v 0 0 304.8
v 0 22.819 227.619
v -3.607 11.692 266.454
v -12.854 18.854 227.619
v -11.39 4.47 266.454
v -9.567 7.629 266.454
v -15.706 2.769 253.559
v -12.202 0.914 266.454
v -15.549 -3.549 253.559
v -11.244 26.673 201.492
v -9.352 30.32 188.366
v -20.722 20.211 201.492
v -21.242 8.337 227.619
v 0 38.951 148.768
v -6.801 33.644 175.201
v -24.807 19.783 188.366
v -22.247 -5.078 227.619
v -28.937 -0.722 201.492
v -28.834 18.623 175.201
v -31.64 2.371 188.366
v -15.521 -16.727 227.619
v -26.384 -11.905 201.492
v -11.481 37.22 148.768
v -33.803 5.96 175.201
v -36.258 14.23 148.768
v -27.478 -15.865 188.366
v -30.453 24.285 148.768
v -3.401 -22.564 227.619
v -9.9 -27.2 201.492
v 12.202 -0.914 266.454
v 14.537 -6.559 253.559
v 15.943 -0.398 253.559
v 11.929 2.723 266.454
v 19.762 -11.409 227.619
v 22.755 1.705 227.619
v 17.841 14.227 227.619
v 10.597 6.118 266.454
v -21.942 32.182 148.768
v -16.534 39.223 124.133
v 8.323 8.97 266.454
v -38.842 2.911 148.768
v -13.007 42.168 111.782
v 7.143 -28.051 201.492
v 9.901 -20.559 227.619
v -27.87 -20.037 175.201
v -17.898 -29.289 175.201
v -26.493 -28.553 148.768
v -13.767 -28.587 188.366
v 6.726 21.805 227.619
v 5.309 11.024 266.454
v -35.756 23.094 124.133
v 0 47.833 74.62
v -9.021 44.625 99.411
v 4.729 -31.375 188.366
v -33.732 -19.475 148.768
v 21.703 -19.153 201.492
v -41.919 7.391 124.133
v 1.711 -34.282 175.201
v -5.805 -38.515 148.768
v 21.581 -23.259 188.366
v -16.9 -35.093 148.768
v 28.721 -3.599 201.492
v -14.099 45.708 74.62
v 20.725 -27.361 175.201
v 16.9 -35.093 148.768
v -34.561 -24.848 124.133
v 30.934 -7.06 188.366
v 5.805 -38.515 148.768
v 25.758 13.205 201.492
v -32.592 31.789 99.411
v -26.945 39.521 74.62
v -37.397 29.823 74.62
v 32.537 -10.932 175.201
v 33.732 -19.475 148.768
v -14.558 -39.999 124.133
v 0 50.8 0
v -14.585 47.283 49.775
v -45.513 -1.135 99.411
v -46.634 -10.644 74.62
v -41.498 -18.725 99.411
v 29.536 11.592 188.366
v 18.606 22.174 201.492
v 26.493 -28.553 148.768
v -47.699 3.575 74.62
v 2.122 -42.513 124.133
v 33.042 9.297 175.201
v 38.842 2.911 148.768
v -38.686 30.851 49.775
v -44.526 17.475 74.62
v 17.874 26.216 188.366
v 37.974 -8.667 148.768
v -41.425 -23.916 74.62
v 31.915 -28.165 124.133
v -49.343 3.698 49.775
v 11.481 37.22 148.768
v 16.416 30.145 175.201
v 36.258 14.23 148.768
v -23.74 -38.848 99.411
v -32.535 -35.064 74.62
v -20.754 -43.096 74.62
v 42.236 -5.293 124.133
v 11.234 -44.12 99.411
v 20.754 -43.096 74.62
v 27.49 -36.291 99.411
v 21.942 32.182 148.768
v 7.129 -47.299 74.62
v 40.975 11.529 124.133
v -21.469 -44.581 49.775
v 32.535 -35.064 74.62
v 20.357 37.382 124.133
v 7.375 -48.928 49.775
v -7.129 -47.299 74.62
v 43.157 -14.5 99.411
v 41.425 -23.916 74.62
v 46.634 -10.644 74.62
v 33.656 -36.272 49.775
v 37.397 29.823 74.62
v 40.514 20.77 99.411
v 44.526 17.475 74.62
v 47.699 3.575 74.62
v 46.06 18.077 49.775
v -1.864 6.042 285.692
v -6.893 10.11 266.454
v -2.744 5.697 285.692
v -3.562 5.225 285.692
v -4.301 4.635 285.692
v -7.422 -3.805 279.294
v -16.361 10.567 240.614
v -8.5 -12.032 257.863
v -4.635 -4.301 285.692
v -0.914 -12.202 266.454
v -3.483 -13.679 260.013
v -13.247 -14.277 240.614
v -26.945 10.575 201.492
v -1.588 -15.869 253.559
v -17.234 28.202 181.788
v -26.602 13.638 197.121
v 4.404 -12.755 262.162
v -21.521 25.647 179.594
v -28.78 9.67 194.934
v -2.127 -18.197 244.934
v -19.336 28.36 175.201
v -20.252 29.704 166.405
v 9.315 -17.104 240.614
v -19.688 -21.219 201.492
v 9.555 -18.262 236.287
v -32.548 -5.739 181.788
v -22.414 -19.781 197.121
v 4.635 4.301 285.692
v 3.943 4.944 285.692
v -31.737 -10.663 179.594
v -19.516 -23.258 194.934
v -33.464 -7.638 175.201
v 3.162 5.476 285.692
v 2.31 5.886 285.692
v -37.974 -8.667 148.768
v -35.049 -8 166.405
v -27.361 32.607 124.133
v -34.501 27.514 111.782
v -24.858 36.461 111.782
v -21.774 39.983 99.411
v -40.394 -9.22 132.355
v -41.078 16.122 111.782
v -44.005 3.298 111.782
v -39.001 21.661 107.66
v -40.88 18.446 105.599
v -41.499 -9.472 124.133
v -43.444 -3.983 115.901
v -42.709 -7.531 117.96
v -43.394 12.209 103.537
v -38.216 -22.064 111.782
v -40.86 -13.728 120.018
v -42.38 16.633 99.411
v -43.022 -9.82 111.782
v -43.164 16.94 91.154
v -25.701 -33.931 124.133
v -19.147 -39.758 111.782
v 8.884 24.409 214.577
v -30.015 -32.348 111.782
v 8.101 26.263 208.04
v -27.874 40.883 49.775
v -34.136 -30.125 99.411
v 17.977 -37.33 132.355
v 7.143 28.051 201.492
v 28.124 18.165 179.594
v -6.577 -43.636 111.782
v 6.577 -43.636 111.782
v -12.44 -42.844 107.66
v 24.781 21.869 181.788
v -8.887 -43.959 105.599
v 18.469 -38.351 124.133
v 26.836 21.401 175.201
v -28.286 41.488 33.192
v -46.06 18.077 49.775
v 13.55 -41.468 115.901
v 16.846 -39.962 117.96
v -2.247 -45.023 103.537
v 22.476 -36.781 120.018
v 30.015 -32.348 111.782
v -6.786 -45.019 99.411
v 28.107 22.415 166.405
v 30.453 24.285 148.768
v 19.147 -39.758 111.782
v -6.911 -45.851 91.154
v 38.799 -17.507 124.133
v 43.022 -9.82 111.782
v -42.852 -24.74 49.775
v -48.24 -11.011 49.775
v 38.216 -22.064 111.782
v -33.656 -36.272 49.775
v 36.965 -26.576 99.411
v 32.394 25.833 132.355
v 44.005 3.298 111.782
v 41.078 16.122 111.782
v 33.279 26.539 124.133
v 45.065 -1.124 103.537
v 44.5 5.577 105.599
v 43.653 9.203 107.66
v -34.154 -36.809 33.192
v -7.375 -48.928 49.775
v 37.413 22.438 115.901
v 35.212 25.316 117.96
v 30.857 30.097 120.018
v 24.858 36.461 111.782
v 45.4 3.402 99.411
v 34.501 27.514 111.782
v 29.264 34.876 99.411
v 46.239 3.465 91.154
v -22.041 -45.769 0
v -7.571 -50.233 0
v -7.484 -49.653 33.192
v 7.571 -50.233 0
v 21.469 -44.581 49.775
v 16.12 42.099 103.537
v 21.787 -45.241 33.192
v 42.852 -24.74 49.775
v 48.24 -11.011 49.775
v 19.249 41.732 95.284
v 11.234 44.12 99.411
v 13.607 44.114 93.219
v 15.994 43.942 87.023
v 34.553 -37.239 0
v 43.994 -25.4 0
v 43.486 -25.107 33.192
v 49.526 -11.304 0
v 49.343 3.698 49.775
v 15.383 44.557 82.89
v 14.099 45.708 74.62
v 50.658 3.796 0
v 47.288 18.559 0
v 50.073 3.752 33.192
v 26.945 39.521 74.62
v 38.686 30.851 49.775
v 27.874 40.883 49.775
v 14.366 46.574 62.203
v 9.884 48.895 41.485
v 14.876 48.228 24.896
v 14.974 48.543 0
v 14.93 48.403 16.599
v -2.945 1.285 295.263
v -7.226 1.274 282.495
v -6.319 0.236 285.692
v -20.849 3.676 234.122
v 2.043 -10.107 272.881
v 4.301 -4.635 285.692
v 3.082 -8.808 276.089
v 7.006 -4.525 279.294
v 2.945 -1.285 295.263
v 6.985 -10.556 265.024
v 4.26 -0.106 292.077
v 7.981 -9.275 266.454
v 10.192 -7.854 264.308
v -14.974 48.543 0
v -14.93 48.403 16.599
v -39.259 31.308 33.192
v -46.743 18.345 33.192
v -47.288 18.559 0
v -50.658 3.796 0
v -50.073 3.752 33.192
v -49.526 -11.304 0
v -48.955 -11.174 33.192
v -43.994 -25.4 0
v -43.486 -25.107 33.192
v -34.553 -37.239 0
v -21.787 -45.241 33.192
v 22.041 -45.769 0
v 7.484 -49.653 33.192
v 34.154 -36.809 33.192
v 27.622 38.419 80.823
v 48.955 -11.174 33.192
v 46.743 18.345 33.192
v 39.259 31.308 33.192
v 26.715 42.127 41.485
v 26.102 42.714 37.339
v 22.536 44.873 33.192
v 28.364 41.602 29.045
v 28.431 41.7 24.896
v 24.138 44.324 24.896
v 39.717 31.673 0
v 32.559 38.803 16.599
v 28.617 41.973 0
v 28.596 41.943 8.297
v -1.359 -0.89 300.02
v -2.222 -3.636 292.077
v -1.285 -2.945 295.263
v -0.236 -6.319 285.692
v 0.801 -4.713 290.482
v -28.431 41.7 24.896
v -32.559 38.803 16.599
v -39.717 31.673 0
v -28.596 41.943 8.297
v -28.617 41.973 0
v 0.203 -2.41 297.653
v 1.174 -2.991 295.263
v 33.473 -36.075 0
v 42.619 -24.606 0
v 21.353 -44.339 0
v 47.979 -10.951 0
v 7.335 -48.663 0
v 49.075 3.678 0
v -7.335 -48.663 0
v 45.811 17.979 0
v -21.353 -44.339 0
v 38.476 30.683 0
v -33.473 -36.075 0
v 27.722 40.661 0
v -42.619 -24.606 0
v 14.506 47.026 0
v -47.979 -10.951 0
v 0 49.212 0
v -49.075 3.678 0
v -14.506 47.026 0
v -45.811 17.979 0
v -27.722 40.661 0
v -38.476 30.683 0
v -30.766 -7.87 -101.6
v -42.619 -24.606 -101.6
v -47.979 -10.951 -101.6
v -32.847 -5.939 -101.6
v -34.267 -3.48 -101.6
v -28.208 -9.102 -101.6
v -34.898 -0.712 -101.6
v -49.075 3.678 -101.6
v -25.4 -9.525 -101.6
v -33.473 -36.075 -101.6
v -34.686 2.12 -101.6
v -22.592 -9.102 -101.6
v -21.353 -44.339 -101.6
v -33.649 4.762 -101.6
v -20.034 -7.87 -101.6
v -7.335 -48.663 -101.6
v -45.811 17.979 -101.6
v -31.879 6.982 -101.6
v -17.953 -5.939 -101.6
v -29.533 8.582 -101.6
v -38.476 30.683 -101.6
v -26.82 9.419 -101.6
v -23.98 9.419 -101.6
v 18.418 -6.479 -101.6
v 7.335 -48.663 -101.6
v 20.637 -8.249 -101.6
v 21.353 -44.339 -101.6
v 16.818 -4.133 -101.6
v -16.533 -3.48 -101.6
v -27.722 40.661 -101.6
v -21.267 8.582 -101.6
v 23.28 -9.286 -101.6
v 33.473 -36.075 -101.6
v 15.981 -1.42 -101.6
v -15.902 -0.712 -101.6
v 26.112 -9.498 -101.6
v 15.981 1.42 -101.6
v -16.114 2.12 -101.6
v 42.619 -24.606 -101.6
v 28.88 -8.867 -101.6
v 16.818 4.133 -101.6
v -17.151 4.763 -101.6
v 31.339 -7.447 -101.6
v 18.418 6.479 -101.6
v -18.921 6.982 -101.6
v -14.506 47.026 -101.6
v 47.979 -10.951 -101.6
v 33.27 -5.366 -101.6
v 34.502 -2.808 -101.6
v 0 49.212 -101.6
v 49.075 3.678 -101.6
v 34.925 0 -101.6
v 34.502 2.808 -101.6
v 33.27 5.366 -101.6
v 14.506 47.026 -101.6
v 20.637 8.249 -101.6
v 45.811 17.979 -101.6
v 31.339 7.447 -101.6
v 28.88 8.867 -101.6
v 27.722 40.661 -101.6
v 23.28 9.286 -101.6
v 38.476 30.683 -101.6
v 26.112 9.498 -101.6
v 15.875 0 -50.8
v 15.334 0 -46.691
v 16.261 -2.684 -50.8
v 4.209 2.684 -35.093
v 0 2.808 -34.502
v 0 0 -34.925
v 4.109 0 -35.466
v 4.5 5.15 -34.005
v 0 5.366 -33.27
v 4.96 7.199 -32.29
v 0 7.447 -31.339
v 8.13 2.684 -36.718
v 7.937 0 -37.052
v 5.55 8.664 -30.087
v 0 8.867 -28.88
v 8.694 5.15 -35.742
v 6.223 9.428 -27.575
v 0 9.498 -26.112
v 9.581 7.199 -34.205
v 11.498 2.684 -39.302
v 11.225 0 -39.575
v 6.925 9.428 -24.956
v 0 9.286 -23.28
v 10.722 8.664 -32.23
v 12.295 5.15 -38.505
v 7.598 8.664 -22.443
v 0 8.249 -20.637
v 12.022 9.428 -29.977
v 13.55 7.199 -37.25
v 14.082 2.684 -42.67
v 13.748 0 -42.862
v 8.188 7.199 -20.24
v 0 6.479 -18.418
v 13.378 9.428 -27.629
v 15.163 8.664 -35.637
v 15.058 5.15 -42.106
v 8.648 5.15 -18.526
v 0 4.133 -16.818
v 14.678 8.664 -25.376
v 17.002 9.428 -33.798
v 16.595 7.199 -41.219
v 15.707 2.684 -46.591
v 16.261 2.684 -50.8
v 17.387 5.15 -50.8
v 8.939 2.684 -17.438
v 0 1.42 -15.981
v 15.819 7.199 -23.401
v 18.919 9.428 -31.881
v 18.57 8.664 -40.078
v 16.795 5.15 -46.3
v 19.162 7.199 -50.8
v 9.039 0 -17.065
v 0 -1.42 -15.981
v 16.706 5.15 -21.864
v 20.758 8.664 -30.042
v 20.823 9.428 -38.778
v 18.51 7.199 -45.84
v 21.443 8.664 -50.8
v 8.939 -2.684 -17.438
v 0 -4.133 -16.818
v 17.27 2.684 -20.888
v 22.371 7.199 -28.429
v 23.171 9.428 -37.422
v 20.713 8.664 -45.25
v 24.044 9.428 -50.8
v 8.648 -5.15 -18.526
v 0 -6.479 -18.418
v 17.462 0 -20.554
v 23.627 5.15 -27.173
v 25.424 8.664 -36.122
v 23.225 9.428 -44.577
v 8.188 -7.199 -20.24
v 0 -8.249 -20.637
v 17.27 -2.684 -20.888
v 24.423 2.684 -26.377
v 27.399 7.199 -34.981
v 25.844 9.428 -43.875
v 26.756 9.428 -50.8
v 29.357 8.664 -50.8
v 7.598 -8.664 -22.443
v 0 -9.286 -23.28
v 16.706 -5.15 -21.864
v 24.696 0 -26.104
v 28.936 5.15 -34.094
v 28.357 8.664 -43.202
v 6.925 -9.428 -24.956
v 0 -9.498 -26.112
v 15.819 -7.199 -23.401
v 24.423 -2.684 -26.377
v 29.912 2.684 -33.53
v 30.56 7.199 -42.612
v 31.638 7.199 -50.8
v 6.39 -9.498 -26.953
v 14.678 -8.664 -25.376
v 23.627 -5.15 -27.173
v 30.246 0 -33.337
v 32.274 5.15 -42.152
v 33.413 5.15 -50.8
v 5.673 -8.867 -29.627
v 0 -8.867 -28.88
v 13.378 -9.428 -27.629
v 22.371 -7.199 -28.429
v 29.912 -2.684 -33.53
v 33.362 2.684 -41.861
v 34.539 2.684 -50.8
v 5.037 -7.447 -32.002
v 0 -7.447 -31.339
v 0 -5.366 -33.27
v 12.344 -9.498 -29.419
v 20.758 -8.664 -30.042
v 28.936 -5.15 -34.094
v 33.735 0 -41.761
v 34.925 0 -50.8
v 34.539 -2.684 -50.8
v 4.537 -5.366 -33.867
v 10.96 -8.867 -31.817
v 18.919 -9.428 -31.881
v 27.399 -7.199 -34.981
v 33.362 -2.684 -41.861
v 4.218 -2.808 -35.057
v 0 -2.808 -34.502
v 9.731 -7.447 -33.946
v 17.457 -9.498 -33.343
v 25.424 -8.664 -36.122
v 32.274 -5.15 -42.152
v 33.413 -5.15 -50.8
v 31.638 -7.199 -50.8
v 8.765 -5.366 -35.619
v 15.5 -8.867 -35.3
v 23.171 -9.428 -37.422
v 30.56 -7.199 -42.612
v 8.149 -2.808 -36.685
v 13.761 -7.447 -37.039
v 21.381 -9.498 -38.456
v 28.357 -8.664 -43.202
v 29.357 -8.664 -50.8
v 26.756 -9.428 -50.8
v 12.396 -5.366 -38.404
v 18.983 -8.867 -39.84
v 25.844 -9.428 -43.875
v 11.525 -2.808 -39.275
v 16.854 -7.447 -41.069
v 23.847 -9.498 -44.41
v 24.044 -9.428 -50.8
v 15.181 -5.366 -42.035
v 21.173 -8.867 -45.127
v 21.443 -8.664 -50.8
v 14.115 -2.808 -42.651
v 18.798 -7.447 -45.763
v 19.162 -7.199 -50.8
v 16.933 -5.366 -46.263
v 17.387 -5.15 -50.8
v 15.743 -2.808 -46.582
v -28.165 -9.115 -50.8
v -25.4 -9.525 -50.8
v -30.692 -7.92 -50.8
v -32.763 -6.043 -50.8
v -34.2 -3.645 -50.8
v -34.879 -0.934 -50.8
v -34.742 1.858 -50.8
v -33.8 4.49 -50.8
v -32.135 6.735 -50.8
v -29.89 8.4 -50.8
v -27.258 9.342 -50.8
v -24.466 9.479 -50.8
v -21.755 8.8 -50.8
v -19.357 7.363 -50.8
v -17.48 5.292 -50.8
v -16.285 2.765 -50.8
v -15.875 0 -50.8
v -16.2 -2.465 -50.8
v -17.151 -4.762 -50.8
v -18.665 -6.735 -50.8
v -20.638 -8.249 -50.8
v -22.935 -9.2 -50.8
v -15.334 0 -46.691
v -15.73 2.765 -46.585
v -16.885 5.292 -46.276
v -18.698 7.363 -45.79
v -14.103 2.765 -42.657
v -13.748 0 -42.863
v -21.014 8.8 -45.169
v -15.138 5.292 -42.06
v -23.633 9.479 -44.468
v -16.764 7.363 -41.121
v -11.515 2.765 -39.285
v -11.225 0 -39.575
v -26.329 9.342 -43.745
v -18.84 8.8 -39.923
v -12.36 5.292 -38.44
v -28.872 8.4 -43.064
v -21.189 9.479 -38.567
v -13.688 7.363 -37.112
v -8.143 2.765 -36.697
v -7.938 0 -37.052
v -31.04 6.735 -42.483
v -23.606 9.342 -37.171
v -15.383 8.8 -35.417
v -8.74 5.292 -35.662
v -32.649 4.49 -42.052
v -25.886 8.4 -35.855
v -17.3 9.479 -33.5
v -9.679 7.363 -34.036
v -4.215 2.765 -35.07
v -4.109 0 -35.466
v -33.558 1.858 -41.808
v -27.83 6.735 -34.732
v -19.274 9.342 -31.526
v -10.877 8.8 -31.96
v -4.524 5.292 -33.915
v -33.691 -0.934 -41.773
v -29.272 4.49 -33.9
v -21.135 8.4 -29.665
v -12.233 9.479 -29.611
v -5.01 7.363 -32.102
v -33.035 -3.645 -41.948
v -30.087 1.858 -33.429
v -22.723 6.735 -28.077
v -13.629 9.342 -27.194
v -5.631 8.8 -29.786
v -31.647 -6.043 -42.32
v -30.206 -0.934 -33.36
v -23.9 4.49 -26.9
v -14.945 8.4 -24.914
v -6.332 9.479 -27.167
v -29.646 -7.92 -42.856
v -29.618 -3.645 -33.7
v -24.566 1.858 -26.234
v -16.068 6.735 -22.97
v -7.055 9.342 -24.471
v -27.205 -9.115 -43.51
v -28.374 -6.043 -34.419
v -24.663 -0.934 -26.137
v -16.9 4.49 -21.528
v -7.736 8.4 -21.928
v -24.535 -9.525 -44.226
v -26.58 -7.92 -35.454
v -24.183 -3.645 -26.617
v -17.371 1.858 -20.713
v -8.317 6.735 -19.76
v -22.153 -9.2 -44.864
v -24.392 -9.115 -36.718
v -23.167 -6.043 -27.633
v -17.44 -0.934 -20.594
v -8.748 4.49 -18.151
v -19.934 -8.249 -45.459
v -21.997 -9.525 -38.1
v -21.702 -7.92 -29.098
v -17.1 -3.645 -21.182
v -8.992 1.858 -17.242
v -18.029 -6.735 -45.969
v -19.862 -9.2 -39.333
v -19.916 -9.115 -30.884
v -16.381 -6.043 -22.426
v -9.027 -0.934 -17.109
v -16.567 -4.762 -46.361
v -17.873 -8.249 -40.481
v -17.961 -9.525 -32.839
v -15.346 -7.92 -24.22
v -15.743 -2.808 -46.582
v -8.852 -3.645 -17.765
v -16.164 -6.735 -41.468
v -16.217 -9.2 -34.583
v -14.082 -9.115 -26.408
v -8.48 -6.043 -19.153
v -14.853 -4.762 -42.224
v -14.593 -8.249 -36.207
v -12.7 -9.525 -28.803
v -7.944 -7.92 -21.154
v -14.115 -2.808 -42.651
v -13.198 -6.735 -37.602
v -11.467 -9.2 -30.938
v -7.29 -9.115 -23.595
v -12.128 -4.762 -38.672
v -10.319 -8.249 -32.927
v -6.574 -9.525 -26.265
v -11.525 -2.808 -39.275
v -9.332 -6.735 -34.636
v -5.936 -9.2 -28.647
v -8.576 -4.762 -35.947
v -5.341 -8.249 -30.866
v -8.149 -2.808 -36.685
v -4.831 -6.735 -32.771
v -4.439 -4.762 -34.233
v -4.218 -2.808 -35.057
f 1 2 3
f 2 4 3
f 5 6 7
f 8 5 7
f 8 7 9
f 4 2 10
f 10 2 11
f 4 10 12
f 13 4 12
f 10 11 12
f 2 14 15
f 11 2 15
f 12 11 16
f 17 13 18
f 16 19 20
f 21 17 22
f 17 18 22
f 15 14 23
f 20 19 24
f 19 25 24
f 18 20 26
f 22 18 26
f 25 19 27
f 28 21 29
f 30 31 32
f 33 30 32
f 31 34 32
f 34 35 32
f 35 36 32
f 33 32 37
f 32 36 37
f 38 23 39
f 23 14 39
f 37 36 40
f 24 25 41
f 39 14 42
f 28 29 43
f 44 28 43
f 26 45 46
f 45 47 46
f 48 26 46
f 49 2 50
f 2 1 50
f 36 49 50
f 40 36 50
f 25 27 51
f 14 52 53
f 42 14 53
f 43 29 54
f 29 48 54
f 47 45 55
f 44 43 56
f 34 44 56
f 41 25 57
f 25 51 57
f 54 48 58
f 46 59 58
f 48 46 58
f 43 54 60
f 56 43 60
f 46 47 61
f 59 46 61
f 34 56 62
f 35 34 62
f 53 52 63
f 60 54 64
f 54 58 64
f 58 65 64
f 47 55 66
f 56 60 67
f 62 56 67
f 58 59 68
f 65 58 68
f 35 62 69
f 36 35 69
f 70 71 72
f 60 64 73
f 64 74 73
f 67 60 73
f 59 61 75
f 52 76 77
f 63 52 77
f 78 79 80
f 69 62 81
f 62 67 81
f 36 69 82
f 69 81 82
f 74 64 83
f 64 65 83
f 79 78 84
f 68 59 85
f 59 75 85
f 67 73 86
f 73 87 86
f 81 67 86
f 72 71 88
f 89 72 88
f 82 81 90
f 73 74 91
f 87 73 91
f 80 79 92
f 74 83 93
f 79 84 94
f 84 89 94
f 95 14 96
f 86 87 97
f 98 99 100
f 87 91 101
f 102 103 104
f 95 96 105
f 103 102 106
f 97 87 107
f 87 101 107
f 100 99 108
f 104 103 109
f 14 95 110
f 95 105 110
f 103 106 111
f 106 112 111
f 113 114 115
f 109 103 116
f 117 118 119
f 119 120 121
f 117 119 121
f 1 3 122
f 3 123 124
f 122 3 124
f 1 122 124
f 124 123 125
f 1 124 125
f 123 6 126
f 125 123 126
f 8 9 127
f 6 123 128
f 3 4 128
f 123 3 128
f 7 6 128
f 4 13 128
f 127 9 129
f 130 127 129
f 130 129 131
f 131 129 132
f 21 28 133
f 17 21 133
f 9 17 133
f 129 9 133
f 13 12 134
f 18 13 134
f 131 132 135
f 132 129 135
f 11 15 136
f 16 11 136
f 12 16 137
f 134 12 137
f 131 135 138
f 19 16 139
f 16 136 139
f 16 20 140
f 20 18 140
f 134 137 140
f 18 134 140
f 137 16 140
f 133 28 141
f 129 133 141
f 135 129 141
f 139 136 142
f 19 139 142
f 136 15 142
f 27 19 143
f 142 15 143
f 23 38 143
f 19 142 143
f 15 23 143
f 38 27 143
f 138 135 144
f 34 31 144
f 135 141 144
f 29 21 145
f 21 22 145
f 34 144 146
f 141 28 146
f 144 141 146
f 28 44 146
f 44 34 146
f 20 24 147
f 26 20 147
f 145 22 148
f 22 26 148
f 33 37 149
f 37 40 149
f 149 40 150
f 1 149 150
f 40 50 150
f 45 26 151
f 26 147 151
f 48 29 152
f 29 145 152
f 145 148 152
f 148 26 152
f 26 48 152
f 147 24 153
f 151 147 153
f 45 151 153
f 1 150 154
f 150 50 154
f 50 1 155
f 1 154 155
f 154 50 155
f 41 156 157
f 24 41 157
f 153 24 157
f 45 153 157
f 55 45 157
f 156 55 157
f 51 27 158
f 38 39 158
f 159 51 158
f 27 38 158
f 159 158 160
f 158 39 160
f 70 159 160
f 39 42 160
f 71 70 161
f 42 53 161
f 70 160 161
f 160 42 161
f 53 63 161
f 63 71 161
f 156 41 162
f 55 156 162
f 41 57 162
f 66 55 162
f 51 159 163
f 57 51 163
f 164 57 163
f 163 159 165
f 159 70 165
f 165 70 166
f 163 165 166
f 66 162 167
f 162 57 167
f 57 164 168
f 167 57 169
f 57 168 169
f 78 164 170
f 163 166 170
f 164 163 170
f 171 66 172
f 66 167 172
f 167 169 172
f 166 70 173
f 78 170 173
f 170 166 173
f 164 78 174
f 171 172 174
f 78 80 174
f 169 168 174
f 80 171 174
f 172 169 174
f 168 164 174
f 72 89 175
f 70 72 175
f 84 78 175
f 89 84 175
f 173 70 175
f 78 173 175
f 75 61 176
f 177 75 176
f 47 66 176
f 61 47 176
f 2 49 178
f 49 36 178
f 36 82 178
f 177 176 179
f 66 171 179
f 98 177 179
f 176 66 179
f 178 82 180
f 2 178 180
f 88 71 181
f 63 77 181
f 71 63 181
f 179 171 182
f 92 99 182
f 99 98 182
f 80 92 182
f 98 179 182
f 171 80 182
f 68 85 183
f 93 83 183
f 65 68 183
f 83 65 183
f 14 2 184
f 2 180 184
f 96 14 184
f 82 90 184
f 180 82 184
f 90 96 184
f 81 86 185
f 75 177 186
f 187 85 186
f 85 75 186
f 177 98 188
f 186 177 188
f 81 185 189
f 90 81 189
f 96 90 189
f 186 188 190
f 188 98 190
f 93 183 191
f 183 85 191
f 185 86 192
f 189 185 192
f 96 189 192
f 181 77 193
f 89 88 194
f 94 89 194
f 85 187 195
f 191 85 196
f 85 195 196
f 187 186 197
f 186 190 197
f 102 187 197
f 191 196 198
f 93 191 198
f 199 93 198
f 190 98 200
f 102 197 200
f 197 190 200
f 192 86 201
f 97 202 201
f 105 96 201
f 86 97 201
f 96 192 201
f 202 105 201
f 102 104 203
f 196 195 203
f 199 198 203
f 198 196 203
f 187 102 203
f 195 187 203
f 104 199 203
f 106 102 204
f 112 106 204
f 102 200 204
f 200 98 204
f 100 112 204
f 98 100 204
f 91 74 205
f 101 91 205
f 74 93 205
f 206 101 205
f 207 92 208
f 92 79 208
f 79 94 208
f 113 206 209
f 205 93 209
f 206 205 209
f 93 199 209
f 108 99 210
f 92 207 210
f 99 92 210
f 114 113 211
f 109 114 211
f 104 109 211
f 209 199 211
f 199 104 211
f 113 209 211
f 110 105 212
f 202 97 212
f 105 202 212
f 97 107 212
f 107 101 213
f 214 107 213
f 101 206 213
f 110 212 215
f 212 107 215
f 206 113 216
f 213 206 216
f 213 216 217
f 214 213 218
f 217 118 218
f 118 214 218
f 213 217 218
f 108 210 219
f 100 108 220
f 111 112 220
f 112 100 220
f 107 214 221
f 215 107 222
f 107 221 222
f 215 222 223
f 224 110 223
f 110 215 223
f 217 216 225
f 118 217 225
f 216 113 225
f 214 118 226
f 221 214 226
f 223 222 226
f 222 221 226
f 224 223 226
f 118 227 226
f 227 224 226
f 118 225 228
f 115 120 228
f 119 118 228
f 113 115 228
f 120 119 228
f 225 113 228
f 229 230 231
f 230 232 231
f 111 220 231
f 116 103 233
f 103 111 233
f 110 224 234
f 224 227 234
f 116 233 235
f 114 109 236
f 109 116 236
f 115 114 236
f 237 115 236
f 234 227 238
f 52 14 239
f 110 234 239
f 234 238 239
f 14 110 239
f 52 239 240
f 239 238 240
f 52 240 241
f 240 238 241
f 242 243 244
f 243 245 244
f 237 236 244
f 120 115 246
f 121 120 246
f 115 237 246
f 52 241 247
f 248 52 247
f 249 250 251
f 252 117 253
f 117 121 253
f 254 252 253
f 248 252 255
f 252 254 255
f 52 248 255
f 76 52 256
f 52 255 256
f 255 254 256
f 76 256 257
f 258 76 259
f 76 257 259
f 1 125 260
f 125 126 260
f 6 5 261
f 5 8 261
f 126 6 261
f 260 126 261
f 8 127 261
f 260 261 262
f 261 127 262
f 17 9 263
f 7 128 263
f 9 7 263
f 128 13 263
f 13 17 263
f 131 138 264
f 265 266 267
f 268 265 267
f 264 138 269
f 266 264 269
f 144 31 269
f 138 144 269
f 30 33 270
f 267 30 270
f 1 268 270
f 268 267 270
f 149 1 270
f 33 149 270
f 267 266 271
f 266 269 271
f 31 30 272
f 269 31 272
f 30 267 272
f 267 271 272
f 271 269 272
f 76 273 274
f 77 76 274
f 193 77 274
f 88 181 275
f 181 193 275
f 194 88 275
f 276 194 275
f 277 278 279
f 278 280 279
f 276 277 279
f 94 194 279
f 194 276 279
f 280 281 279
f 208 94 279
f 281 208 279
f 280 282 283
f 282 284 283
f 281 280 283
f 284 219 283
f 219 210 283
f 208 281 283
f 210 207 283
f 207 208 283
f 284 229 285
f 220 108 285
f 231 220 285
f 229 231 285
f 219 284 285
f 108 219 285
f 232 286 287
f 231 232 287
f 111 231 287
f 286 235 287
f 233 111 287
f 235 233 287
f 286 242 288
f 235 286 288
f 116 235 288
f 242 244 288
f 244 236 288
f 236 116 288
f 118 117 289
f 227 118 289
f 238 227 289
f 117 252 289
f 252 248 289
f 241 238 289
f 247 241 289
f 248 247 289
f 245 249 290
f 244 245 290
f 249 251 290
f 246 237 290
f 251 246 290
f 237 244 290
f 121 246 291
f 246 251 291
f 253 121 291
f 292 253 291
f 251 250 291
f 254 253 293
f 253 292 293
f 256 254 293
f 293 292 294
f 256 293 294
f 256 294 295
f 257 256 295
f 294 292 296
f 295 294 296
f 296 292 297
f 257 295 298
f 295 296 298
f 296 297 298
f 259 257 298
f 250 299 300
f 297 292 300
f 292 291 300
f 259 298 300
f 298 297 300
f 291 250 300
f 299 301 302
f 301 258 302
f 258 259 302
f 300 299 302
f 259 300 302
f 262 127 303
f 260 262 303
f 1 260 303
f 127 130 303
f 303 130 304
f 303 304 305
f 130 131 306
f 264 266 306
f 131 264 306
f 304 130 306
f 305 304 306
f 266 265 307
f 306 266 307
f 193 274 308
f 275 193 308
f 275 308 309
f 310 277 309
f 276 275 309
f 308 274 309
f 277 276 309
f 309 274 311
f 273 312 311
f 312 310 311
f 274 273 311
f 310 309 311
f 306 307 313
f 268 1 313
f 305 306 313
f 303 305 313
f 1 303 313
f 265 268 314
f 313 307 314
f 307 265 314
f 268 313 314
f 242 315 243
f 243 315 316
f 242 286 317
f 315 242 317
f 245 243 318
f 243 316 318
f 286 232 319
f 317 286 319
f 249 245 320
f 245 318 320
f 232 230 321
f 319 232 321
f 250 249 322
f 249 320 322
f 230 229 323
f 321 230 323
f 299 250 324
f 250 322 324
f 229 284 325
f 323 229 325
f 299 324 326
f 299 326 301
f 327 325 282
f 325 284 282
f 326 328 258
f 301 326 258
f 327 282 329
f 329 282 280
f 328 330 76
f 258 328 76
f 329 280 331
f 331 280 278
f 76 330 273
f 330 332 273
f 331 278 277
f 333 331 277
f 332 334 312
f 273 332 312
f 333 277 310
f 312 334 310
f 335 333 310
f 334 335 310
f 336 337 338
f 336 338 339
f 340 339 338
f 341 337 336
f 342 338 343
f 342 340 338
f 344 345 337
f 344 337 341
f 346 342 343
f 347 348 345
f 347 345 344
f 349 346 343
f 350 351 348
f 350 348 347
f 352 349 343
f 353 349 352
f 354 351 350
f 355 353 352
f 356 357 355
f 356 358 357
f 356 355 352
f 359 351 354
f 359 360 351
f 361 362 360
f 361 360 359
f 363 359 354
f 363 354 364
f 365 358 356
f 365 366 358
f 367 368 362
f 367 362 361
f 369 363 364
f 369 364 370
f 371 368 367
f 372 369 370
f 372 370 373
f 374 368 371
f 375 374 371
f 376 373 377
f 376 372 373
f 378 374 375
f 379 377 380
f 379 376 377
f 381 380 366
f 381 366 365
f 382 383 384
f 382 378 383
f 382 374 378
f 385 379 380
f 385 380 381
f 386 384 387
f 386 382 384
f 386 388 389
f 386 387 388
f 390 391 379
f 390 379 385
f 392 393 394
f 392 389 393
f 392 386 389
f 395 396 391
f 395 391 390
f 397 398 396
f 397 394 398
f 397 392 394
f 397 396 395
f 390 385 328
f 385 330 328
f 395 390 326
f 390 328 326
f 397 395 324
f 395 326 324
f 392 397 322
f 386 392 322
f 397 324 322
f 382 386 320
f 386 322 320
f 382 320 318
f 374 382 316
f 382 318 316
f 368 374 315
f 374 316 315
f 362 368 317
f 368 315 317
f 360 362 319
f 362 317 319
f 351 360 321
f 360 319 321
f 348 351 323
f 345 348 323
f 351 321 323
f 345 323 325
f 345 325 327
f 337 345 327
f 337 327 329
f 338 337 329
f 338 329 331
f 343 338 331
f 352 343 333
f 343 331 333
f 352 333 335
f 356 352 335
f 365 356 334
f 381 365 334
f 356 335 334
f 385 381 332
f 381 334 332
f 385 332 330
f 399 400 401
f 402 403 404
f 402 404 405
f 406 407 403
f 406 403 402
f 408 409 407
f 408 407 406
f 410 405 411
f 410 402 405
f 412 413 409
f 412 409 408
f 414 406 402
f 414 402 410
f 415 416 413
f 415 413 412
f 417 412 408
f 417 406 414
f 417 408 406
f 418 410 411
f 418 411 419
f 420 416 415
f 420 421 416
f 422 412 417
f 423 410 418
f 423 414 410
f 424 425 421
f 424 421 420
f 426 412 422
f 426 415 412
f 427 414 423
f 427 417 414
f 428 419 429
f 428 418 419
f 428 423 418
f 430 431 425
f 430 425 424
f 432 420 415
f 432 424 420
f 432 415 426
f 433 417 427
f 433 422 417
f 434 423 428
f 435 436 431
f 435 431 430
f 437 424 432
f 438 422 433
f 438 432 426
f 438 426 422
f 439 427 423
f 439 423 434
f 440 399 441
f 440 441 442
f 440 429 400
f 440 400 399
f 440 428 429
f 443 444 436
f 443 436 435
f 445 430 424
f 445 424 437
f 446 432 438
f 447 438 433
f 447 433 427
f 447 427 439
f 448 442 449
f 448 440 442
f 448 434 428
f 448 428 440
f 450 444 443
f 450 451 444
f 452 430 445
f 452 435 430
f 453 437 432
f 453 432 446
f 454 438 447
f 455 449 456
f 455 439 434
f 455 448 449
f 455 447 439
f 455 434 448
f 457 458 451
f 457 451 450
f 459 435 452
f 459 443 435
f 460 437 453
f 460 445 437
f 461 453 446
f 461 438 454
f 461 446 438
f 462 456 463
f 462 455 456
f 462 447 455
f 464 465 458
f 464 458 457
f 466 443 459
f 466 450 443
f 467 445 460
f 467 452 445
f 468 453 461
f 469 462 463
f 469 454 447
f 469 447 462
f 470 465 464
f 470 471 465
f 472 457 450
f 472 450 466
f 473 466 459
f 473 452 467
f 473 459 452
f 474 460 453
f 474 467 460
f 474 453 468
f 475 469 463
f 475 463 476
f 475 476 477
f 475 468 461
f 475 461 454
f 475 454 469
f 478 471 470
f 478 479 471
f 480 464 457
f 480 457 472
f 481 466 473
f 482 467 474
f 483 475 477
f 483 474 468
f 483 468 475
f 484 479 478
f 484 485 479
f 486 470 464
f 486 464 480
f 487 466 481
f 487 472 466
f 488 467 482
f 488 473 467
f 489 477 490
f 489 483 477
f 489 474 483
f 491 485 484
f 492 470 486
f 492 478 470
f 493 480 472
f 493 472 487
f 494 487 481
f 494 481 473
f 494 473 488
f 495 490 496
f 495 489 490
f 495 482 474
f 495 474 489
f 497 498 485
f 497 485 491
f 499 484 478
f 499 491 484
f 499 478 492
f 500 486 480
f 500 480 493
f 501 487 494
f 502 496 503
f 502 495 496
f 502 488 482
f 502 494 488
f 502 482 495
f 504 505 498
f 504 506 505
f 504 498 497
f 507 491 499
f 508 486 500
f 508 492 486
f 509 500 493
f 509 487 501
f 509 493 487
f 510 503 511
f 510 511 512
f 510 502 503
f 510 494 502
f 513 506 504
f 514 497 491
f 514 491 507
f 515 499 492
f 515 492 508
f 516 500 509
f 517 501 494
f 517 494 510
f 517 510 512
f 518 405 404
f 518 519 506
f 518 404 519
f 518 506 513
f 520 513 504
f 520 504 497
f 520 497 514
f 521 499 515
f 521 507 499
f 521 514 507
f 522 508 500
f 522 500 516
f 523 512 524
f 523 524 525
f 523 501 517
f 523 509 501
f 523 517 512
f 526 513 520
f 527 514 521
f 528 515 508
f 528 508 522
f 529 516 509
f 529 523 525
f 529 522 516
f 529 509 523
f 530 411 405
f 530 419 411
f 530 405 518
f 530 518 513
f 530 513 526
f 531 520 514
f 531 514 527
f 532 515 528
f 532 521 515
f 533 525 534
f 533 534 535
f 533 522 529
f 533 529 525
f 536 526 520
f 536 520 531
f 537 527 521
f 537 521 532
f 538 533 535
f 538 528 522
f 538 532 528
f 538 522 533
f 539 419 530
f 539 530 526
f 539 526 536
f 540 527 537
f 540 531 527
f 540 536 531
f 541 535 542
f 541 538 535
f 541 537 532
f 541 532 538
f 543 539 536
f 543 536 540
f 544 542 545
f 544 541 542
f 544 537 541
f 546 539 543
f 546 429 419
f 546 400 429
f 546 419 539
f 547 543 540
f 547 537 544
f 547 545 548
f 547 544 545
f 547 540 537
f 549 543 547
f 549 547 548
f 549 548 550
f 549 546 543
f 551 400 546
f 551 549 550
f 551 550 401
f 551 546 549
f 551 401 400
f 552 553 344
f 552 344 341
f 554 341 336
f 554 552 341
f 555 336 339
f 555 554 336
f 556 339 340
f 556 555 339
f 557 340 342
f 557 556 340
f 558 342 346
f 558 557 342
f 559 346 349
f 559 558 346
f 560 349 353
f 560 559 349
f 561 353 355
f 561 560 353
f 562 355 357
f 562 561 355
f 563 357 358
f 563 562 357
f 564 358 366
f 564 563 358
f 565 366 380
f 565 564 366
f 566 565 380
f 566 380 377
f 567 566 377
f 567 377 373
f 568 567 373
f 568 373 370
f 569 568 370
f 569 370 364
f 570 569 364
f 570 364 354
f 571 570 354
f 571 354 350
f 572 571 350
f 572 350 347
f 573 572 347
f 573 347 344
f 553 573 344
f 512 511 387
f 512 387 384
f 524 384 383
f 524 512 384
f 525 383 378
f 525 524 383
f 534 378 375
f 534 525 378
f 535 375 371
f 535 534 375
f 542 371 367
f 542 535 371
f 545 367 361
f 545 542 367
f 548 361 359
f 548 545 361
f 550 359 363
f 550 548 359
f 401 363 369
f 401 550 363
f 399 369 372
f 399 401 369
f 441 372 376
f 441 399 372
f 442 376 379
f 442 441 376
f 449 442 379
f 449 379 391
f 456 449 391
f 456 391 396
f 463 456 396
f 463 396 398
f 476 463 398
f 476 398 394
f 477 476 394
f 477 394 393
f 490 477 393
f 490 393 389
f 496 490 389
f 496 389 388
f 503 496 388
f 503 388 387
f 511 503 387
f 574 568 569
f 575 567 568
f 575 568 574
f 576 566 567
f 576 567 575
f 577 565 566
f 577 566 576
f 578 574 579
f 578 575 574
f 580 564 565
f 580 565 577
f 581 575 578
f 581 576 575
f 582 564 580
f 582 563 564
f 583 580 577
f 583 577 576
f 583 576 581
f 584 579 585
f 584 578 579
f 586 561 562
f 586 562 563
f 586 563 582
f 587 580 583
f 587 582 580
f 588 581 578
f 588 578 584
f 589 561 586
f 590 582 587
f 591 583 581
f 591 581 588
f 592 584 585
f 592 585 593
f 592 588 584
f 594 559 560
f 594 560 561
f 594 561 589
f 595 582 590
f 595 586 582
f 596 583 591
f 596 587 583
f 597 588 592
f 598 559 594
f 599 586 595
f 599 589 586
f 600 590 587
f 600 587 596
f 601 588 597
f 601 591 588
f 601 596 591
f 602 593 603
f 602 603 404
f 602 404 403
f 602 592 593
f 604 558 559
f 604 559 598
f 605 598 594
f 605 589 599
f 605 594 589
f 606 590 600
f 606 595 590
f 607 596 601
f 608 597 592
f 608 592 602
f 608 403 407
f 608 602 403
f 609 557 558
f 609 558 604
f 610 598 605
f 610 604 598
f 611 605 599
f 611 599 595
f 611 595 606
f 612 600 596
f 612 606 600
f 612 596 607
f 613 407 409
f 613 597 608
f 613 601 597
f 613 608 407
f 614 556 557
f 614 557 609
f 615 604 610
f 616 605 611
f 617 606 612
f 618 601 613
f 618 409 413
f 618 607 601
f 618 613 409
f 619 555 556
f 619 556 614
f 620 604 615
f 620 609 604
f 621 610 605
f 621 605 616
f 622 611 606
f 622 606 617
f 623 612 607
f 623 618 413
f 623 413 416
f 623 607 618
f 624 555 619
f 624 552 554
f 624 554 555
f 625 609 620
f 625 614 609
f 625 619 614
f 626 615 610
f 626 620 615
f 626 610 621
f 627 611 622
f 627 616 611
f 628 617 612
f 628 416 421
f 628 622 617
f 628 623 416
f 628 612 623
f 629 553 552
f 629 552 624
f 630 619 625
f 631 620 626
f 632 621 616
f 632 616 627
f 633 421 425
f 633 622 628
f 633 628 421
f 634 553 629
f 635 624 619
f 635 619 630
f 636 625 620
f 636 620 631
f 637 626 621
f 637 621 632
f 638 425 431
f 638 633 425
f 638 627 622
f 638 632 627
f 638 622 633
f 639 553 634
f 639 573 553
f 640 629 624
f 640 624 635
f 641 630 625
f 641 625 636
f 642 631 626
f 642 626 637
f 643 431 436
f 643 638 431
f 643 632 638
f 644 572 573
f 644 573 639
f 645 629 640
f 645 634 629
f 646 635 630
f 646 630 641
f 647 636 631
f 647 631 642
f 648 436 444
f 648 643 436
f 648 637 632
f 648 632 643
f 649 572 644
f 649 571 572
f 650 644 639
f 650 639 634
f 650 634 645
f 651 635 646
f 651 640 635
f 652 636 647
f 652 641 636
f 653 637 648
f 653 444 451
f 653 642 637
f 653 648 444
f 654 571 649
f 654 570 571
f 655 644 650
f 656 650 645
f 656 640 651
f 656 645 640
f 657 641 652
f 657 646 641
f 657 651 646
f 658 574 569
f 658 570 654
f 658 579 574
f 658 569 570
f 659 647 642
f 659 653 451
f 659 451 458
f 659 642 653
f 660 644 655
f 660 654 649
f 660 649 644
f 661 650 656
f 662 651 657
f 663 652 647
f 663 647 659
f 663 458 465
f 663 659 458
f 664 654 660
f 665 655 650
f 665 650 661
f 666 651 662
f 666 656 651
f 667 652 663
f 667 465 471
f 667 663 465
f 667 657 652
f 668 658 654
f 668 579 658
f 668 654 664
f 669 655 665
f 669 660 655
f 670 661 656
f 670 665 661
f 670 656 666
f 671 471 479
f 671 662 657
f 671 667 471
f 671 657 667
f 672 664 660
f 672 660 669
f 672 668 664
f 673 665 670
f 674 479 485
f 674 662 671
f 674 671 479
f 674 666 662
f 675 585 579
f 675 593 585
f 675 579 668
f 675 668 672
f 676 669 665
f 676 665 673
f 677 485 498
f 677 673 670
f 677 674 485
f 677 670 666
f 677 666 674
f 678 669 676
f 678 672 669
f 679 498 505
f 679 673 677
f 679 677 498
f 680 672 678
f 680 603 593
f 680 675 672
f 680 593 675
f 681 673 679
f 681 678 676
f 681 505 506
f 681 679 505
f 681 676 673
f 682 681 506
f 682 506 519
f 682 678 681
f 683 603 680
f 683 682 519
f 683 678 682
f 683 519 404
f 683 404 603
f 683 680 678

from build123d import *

# Parameters (mm, degrees)
SKETCH2_R           = 49.2125
BOSS_EXTRUDE1_DEPTH = 50.8
SKETCH3_R           = 9.525
SKETCH4_R           = 49.2125
SKETCH4_R_2         = 9.525
BOSS_EXTRUDE2_DEPTH = 50.8


with BuildPart() as part:
    # Sketch1 → Revolve1 (revolve)
    with BuildSketch(Plane(origin=(0, 0, 0), x_dir=(0, 0, -1), z_dir=(1, 0, 0))):
        with BuildLine():
            Line((0, 0), (-304.8, 0))
            add(Edge.make_bspline(
                [(-304.8, 0), (-304.382425601, 0.143168366), (-303.540765888, 0.430899345), (-301.740901659, 1.044224359), (-299.788343499, 1.703616117), (-297.798910734, 2.370622283), (-295.782175929, 3.041960911), (-293.777683441, 3.704074038), (-291.768115862, 4.362899187), (-289.746498304, 5.020634276), (-287.712339913, 5.677355174), (-268.688556224, 11.771202945), (-231.321588698, 22.614032917), (-177.061866436, 35.203944952), (-118.24504839, 44.082248155), (-74.116427434, 48.134305599), (-47.14784979, 49.654737541), (-36.353282187, 50.114030962), (-28.794561554, 50.366026549), (-23.934493272, 50.49822726), (-20.694154368, 50.573944325), (-17.741054824, 50.63389122), (-15.603916609, 50.671594447), (-13.478042738, 50.704275318), (-11.363951605, 50.732021274), (-9.516855824, 50.752830907), (-7.391927552, 50.771857001), (-5.292027124, 50.786126656), (-3.234867855, 50.7956398), (-1.330315082, 50.799207238), (-0.441435733, 50.800000002), (0, 50.800000002)],
                knots=[0.082835744, 0.082835744, 0.082835744, 0.082835744, 0.082835744, 0.088524103, 0.094212462, 0.099900821, 0.10558918, 0.111277539, 0.116965898, 0.122654257, 0.128342616, 0.134156146, 0.139969677, 0.337629697, 0.546916774, 0.732949735, 0.779457974, 0.814339154, 0.837593273, 0.849220333, 0.860847393, 0.866660923, 0.872474453, 0.88100699, 0.88385117, 0.889539528, 0.895227886, 0.900916244, 0.906604603, 0.912292961, 0.917981319, 0.917981319, 0.917981319, 0.917981319, 0.917981319], degree=4))
            Line((0, 50.800000002), (0, 0))
        make_face()
    revolve(axis=Axis((0, 0, 0), (0, 0, 1)))

    # Sketch2 → Boss-Extrude1 (add)
    with BuildSketch(Plane(origin=(0, 0, 0), x_dir=(-1, 0, 0), z_dir=(0, 0, -1))):
        with Locations(Location((0, 0, 0), (0, 0, 90))):
            Circle(SKETCH2_R)
    extrude(amount=BOSS_EXTRUDE1_DEPTH)

    # Sketch3 → Cut-Revolve3 (revolve, cut)
    with BuildSketch(Plane(origin=(0, 0, -50.8), x_dir=(-1, 0, 0), z_dir=(0, 0, -1)), mode=Mode.PRIVATE) as cut_revolve3_sk:
        with Locations((-25.4, 0)):
            Circle(SKETCH3_R)
    revolve(cut_revolve3_sk.sketch.rotate(Axis((0, 0, -50.8), (0, 1, 0)), 270), axis=Axis((0, 0, -50.8), (0, 1, 0)), mode=Mode.SUBTRACT)

    # Sketch4 → Boss-Extrude2 (add)
    with BuildSketch(Plane(origin=(0, 0, -50.8), x_dir=(-1, 0, 0), z_dir=(0, 0, -1))):
        with Locations(Location((0, 0, 0), (0, 0, 90))):
            Circle(SKETCH4_R)
        with Locations(Location((-25.4, 0, 0), (0, 0, 180))):
            Circle(SKETCH4_R_2, mode=Mode.SUBTRACT)
        with Locations(Location((25.4, 0, 0), (0, 0, 270))):
            Circle(SKETCH4_R_2, mode=Mode.SUBTRACT)
    extrude(amount=BOSS_EXTRUDE2_DEPTH)


solid = part.part
